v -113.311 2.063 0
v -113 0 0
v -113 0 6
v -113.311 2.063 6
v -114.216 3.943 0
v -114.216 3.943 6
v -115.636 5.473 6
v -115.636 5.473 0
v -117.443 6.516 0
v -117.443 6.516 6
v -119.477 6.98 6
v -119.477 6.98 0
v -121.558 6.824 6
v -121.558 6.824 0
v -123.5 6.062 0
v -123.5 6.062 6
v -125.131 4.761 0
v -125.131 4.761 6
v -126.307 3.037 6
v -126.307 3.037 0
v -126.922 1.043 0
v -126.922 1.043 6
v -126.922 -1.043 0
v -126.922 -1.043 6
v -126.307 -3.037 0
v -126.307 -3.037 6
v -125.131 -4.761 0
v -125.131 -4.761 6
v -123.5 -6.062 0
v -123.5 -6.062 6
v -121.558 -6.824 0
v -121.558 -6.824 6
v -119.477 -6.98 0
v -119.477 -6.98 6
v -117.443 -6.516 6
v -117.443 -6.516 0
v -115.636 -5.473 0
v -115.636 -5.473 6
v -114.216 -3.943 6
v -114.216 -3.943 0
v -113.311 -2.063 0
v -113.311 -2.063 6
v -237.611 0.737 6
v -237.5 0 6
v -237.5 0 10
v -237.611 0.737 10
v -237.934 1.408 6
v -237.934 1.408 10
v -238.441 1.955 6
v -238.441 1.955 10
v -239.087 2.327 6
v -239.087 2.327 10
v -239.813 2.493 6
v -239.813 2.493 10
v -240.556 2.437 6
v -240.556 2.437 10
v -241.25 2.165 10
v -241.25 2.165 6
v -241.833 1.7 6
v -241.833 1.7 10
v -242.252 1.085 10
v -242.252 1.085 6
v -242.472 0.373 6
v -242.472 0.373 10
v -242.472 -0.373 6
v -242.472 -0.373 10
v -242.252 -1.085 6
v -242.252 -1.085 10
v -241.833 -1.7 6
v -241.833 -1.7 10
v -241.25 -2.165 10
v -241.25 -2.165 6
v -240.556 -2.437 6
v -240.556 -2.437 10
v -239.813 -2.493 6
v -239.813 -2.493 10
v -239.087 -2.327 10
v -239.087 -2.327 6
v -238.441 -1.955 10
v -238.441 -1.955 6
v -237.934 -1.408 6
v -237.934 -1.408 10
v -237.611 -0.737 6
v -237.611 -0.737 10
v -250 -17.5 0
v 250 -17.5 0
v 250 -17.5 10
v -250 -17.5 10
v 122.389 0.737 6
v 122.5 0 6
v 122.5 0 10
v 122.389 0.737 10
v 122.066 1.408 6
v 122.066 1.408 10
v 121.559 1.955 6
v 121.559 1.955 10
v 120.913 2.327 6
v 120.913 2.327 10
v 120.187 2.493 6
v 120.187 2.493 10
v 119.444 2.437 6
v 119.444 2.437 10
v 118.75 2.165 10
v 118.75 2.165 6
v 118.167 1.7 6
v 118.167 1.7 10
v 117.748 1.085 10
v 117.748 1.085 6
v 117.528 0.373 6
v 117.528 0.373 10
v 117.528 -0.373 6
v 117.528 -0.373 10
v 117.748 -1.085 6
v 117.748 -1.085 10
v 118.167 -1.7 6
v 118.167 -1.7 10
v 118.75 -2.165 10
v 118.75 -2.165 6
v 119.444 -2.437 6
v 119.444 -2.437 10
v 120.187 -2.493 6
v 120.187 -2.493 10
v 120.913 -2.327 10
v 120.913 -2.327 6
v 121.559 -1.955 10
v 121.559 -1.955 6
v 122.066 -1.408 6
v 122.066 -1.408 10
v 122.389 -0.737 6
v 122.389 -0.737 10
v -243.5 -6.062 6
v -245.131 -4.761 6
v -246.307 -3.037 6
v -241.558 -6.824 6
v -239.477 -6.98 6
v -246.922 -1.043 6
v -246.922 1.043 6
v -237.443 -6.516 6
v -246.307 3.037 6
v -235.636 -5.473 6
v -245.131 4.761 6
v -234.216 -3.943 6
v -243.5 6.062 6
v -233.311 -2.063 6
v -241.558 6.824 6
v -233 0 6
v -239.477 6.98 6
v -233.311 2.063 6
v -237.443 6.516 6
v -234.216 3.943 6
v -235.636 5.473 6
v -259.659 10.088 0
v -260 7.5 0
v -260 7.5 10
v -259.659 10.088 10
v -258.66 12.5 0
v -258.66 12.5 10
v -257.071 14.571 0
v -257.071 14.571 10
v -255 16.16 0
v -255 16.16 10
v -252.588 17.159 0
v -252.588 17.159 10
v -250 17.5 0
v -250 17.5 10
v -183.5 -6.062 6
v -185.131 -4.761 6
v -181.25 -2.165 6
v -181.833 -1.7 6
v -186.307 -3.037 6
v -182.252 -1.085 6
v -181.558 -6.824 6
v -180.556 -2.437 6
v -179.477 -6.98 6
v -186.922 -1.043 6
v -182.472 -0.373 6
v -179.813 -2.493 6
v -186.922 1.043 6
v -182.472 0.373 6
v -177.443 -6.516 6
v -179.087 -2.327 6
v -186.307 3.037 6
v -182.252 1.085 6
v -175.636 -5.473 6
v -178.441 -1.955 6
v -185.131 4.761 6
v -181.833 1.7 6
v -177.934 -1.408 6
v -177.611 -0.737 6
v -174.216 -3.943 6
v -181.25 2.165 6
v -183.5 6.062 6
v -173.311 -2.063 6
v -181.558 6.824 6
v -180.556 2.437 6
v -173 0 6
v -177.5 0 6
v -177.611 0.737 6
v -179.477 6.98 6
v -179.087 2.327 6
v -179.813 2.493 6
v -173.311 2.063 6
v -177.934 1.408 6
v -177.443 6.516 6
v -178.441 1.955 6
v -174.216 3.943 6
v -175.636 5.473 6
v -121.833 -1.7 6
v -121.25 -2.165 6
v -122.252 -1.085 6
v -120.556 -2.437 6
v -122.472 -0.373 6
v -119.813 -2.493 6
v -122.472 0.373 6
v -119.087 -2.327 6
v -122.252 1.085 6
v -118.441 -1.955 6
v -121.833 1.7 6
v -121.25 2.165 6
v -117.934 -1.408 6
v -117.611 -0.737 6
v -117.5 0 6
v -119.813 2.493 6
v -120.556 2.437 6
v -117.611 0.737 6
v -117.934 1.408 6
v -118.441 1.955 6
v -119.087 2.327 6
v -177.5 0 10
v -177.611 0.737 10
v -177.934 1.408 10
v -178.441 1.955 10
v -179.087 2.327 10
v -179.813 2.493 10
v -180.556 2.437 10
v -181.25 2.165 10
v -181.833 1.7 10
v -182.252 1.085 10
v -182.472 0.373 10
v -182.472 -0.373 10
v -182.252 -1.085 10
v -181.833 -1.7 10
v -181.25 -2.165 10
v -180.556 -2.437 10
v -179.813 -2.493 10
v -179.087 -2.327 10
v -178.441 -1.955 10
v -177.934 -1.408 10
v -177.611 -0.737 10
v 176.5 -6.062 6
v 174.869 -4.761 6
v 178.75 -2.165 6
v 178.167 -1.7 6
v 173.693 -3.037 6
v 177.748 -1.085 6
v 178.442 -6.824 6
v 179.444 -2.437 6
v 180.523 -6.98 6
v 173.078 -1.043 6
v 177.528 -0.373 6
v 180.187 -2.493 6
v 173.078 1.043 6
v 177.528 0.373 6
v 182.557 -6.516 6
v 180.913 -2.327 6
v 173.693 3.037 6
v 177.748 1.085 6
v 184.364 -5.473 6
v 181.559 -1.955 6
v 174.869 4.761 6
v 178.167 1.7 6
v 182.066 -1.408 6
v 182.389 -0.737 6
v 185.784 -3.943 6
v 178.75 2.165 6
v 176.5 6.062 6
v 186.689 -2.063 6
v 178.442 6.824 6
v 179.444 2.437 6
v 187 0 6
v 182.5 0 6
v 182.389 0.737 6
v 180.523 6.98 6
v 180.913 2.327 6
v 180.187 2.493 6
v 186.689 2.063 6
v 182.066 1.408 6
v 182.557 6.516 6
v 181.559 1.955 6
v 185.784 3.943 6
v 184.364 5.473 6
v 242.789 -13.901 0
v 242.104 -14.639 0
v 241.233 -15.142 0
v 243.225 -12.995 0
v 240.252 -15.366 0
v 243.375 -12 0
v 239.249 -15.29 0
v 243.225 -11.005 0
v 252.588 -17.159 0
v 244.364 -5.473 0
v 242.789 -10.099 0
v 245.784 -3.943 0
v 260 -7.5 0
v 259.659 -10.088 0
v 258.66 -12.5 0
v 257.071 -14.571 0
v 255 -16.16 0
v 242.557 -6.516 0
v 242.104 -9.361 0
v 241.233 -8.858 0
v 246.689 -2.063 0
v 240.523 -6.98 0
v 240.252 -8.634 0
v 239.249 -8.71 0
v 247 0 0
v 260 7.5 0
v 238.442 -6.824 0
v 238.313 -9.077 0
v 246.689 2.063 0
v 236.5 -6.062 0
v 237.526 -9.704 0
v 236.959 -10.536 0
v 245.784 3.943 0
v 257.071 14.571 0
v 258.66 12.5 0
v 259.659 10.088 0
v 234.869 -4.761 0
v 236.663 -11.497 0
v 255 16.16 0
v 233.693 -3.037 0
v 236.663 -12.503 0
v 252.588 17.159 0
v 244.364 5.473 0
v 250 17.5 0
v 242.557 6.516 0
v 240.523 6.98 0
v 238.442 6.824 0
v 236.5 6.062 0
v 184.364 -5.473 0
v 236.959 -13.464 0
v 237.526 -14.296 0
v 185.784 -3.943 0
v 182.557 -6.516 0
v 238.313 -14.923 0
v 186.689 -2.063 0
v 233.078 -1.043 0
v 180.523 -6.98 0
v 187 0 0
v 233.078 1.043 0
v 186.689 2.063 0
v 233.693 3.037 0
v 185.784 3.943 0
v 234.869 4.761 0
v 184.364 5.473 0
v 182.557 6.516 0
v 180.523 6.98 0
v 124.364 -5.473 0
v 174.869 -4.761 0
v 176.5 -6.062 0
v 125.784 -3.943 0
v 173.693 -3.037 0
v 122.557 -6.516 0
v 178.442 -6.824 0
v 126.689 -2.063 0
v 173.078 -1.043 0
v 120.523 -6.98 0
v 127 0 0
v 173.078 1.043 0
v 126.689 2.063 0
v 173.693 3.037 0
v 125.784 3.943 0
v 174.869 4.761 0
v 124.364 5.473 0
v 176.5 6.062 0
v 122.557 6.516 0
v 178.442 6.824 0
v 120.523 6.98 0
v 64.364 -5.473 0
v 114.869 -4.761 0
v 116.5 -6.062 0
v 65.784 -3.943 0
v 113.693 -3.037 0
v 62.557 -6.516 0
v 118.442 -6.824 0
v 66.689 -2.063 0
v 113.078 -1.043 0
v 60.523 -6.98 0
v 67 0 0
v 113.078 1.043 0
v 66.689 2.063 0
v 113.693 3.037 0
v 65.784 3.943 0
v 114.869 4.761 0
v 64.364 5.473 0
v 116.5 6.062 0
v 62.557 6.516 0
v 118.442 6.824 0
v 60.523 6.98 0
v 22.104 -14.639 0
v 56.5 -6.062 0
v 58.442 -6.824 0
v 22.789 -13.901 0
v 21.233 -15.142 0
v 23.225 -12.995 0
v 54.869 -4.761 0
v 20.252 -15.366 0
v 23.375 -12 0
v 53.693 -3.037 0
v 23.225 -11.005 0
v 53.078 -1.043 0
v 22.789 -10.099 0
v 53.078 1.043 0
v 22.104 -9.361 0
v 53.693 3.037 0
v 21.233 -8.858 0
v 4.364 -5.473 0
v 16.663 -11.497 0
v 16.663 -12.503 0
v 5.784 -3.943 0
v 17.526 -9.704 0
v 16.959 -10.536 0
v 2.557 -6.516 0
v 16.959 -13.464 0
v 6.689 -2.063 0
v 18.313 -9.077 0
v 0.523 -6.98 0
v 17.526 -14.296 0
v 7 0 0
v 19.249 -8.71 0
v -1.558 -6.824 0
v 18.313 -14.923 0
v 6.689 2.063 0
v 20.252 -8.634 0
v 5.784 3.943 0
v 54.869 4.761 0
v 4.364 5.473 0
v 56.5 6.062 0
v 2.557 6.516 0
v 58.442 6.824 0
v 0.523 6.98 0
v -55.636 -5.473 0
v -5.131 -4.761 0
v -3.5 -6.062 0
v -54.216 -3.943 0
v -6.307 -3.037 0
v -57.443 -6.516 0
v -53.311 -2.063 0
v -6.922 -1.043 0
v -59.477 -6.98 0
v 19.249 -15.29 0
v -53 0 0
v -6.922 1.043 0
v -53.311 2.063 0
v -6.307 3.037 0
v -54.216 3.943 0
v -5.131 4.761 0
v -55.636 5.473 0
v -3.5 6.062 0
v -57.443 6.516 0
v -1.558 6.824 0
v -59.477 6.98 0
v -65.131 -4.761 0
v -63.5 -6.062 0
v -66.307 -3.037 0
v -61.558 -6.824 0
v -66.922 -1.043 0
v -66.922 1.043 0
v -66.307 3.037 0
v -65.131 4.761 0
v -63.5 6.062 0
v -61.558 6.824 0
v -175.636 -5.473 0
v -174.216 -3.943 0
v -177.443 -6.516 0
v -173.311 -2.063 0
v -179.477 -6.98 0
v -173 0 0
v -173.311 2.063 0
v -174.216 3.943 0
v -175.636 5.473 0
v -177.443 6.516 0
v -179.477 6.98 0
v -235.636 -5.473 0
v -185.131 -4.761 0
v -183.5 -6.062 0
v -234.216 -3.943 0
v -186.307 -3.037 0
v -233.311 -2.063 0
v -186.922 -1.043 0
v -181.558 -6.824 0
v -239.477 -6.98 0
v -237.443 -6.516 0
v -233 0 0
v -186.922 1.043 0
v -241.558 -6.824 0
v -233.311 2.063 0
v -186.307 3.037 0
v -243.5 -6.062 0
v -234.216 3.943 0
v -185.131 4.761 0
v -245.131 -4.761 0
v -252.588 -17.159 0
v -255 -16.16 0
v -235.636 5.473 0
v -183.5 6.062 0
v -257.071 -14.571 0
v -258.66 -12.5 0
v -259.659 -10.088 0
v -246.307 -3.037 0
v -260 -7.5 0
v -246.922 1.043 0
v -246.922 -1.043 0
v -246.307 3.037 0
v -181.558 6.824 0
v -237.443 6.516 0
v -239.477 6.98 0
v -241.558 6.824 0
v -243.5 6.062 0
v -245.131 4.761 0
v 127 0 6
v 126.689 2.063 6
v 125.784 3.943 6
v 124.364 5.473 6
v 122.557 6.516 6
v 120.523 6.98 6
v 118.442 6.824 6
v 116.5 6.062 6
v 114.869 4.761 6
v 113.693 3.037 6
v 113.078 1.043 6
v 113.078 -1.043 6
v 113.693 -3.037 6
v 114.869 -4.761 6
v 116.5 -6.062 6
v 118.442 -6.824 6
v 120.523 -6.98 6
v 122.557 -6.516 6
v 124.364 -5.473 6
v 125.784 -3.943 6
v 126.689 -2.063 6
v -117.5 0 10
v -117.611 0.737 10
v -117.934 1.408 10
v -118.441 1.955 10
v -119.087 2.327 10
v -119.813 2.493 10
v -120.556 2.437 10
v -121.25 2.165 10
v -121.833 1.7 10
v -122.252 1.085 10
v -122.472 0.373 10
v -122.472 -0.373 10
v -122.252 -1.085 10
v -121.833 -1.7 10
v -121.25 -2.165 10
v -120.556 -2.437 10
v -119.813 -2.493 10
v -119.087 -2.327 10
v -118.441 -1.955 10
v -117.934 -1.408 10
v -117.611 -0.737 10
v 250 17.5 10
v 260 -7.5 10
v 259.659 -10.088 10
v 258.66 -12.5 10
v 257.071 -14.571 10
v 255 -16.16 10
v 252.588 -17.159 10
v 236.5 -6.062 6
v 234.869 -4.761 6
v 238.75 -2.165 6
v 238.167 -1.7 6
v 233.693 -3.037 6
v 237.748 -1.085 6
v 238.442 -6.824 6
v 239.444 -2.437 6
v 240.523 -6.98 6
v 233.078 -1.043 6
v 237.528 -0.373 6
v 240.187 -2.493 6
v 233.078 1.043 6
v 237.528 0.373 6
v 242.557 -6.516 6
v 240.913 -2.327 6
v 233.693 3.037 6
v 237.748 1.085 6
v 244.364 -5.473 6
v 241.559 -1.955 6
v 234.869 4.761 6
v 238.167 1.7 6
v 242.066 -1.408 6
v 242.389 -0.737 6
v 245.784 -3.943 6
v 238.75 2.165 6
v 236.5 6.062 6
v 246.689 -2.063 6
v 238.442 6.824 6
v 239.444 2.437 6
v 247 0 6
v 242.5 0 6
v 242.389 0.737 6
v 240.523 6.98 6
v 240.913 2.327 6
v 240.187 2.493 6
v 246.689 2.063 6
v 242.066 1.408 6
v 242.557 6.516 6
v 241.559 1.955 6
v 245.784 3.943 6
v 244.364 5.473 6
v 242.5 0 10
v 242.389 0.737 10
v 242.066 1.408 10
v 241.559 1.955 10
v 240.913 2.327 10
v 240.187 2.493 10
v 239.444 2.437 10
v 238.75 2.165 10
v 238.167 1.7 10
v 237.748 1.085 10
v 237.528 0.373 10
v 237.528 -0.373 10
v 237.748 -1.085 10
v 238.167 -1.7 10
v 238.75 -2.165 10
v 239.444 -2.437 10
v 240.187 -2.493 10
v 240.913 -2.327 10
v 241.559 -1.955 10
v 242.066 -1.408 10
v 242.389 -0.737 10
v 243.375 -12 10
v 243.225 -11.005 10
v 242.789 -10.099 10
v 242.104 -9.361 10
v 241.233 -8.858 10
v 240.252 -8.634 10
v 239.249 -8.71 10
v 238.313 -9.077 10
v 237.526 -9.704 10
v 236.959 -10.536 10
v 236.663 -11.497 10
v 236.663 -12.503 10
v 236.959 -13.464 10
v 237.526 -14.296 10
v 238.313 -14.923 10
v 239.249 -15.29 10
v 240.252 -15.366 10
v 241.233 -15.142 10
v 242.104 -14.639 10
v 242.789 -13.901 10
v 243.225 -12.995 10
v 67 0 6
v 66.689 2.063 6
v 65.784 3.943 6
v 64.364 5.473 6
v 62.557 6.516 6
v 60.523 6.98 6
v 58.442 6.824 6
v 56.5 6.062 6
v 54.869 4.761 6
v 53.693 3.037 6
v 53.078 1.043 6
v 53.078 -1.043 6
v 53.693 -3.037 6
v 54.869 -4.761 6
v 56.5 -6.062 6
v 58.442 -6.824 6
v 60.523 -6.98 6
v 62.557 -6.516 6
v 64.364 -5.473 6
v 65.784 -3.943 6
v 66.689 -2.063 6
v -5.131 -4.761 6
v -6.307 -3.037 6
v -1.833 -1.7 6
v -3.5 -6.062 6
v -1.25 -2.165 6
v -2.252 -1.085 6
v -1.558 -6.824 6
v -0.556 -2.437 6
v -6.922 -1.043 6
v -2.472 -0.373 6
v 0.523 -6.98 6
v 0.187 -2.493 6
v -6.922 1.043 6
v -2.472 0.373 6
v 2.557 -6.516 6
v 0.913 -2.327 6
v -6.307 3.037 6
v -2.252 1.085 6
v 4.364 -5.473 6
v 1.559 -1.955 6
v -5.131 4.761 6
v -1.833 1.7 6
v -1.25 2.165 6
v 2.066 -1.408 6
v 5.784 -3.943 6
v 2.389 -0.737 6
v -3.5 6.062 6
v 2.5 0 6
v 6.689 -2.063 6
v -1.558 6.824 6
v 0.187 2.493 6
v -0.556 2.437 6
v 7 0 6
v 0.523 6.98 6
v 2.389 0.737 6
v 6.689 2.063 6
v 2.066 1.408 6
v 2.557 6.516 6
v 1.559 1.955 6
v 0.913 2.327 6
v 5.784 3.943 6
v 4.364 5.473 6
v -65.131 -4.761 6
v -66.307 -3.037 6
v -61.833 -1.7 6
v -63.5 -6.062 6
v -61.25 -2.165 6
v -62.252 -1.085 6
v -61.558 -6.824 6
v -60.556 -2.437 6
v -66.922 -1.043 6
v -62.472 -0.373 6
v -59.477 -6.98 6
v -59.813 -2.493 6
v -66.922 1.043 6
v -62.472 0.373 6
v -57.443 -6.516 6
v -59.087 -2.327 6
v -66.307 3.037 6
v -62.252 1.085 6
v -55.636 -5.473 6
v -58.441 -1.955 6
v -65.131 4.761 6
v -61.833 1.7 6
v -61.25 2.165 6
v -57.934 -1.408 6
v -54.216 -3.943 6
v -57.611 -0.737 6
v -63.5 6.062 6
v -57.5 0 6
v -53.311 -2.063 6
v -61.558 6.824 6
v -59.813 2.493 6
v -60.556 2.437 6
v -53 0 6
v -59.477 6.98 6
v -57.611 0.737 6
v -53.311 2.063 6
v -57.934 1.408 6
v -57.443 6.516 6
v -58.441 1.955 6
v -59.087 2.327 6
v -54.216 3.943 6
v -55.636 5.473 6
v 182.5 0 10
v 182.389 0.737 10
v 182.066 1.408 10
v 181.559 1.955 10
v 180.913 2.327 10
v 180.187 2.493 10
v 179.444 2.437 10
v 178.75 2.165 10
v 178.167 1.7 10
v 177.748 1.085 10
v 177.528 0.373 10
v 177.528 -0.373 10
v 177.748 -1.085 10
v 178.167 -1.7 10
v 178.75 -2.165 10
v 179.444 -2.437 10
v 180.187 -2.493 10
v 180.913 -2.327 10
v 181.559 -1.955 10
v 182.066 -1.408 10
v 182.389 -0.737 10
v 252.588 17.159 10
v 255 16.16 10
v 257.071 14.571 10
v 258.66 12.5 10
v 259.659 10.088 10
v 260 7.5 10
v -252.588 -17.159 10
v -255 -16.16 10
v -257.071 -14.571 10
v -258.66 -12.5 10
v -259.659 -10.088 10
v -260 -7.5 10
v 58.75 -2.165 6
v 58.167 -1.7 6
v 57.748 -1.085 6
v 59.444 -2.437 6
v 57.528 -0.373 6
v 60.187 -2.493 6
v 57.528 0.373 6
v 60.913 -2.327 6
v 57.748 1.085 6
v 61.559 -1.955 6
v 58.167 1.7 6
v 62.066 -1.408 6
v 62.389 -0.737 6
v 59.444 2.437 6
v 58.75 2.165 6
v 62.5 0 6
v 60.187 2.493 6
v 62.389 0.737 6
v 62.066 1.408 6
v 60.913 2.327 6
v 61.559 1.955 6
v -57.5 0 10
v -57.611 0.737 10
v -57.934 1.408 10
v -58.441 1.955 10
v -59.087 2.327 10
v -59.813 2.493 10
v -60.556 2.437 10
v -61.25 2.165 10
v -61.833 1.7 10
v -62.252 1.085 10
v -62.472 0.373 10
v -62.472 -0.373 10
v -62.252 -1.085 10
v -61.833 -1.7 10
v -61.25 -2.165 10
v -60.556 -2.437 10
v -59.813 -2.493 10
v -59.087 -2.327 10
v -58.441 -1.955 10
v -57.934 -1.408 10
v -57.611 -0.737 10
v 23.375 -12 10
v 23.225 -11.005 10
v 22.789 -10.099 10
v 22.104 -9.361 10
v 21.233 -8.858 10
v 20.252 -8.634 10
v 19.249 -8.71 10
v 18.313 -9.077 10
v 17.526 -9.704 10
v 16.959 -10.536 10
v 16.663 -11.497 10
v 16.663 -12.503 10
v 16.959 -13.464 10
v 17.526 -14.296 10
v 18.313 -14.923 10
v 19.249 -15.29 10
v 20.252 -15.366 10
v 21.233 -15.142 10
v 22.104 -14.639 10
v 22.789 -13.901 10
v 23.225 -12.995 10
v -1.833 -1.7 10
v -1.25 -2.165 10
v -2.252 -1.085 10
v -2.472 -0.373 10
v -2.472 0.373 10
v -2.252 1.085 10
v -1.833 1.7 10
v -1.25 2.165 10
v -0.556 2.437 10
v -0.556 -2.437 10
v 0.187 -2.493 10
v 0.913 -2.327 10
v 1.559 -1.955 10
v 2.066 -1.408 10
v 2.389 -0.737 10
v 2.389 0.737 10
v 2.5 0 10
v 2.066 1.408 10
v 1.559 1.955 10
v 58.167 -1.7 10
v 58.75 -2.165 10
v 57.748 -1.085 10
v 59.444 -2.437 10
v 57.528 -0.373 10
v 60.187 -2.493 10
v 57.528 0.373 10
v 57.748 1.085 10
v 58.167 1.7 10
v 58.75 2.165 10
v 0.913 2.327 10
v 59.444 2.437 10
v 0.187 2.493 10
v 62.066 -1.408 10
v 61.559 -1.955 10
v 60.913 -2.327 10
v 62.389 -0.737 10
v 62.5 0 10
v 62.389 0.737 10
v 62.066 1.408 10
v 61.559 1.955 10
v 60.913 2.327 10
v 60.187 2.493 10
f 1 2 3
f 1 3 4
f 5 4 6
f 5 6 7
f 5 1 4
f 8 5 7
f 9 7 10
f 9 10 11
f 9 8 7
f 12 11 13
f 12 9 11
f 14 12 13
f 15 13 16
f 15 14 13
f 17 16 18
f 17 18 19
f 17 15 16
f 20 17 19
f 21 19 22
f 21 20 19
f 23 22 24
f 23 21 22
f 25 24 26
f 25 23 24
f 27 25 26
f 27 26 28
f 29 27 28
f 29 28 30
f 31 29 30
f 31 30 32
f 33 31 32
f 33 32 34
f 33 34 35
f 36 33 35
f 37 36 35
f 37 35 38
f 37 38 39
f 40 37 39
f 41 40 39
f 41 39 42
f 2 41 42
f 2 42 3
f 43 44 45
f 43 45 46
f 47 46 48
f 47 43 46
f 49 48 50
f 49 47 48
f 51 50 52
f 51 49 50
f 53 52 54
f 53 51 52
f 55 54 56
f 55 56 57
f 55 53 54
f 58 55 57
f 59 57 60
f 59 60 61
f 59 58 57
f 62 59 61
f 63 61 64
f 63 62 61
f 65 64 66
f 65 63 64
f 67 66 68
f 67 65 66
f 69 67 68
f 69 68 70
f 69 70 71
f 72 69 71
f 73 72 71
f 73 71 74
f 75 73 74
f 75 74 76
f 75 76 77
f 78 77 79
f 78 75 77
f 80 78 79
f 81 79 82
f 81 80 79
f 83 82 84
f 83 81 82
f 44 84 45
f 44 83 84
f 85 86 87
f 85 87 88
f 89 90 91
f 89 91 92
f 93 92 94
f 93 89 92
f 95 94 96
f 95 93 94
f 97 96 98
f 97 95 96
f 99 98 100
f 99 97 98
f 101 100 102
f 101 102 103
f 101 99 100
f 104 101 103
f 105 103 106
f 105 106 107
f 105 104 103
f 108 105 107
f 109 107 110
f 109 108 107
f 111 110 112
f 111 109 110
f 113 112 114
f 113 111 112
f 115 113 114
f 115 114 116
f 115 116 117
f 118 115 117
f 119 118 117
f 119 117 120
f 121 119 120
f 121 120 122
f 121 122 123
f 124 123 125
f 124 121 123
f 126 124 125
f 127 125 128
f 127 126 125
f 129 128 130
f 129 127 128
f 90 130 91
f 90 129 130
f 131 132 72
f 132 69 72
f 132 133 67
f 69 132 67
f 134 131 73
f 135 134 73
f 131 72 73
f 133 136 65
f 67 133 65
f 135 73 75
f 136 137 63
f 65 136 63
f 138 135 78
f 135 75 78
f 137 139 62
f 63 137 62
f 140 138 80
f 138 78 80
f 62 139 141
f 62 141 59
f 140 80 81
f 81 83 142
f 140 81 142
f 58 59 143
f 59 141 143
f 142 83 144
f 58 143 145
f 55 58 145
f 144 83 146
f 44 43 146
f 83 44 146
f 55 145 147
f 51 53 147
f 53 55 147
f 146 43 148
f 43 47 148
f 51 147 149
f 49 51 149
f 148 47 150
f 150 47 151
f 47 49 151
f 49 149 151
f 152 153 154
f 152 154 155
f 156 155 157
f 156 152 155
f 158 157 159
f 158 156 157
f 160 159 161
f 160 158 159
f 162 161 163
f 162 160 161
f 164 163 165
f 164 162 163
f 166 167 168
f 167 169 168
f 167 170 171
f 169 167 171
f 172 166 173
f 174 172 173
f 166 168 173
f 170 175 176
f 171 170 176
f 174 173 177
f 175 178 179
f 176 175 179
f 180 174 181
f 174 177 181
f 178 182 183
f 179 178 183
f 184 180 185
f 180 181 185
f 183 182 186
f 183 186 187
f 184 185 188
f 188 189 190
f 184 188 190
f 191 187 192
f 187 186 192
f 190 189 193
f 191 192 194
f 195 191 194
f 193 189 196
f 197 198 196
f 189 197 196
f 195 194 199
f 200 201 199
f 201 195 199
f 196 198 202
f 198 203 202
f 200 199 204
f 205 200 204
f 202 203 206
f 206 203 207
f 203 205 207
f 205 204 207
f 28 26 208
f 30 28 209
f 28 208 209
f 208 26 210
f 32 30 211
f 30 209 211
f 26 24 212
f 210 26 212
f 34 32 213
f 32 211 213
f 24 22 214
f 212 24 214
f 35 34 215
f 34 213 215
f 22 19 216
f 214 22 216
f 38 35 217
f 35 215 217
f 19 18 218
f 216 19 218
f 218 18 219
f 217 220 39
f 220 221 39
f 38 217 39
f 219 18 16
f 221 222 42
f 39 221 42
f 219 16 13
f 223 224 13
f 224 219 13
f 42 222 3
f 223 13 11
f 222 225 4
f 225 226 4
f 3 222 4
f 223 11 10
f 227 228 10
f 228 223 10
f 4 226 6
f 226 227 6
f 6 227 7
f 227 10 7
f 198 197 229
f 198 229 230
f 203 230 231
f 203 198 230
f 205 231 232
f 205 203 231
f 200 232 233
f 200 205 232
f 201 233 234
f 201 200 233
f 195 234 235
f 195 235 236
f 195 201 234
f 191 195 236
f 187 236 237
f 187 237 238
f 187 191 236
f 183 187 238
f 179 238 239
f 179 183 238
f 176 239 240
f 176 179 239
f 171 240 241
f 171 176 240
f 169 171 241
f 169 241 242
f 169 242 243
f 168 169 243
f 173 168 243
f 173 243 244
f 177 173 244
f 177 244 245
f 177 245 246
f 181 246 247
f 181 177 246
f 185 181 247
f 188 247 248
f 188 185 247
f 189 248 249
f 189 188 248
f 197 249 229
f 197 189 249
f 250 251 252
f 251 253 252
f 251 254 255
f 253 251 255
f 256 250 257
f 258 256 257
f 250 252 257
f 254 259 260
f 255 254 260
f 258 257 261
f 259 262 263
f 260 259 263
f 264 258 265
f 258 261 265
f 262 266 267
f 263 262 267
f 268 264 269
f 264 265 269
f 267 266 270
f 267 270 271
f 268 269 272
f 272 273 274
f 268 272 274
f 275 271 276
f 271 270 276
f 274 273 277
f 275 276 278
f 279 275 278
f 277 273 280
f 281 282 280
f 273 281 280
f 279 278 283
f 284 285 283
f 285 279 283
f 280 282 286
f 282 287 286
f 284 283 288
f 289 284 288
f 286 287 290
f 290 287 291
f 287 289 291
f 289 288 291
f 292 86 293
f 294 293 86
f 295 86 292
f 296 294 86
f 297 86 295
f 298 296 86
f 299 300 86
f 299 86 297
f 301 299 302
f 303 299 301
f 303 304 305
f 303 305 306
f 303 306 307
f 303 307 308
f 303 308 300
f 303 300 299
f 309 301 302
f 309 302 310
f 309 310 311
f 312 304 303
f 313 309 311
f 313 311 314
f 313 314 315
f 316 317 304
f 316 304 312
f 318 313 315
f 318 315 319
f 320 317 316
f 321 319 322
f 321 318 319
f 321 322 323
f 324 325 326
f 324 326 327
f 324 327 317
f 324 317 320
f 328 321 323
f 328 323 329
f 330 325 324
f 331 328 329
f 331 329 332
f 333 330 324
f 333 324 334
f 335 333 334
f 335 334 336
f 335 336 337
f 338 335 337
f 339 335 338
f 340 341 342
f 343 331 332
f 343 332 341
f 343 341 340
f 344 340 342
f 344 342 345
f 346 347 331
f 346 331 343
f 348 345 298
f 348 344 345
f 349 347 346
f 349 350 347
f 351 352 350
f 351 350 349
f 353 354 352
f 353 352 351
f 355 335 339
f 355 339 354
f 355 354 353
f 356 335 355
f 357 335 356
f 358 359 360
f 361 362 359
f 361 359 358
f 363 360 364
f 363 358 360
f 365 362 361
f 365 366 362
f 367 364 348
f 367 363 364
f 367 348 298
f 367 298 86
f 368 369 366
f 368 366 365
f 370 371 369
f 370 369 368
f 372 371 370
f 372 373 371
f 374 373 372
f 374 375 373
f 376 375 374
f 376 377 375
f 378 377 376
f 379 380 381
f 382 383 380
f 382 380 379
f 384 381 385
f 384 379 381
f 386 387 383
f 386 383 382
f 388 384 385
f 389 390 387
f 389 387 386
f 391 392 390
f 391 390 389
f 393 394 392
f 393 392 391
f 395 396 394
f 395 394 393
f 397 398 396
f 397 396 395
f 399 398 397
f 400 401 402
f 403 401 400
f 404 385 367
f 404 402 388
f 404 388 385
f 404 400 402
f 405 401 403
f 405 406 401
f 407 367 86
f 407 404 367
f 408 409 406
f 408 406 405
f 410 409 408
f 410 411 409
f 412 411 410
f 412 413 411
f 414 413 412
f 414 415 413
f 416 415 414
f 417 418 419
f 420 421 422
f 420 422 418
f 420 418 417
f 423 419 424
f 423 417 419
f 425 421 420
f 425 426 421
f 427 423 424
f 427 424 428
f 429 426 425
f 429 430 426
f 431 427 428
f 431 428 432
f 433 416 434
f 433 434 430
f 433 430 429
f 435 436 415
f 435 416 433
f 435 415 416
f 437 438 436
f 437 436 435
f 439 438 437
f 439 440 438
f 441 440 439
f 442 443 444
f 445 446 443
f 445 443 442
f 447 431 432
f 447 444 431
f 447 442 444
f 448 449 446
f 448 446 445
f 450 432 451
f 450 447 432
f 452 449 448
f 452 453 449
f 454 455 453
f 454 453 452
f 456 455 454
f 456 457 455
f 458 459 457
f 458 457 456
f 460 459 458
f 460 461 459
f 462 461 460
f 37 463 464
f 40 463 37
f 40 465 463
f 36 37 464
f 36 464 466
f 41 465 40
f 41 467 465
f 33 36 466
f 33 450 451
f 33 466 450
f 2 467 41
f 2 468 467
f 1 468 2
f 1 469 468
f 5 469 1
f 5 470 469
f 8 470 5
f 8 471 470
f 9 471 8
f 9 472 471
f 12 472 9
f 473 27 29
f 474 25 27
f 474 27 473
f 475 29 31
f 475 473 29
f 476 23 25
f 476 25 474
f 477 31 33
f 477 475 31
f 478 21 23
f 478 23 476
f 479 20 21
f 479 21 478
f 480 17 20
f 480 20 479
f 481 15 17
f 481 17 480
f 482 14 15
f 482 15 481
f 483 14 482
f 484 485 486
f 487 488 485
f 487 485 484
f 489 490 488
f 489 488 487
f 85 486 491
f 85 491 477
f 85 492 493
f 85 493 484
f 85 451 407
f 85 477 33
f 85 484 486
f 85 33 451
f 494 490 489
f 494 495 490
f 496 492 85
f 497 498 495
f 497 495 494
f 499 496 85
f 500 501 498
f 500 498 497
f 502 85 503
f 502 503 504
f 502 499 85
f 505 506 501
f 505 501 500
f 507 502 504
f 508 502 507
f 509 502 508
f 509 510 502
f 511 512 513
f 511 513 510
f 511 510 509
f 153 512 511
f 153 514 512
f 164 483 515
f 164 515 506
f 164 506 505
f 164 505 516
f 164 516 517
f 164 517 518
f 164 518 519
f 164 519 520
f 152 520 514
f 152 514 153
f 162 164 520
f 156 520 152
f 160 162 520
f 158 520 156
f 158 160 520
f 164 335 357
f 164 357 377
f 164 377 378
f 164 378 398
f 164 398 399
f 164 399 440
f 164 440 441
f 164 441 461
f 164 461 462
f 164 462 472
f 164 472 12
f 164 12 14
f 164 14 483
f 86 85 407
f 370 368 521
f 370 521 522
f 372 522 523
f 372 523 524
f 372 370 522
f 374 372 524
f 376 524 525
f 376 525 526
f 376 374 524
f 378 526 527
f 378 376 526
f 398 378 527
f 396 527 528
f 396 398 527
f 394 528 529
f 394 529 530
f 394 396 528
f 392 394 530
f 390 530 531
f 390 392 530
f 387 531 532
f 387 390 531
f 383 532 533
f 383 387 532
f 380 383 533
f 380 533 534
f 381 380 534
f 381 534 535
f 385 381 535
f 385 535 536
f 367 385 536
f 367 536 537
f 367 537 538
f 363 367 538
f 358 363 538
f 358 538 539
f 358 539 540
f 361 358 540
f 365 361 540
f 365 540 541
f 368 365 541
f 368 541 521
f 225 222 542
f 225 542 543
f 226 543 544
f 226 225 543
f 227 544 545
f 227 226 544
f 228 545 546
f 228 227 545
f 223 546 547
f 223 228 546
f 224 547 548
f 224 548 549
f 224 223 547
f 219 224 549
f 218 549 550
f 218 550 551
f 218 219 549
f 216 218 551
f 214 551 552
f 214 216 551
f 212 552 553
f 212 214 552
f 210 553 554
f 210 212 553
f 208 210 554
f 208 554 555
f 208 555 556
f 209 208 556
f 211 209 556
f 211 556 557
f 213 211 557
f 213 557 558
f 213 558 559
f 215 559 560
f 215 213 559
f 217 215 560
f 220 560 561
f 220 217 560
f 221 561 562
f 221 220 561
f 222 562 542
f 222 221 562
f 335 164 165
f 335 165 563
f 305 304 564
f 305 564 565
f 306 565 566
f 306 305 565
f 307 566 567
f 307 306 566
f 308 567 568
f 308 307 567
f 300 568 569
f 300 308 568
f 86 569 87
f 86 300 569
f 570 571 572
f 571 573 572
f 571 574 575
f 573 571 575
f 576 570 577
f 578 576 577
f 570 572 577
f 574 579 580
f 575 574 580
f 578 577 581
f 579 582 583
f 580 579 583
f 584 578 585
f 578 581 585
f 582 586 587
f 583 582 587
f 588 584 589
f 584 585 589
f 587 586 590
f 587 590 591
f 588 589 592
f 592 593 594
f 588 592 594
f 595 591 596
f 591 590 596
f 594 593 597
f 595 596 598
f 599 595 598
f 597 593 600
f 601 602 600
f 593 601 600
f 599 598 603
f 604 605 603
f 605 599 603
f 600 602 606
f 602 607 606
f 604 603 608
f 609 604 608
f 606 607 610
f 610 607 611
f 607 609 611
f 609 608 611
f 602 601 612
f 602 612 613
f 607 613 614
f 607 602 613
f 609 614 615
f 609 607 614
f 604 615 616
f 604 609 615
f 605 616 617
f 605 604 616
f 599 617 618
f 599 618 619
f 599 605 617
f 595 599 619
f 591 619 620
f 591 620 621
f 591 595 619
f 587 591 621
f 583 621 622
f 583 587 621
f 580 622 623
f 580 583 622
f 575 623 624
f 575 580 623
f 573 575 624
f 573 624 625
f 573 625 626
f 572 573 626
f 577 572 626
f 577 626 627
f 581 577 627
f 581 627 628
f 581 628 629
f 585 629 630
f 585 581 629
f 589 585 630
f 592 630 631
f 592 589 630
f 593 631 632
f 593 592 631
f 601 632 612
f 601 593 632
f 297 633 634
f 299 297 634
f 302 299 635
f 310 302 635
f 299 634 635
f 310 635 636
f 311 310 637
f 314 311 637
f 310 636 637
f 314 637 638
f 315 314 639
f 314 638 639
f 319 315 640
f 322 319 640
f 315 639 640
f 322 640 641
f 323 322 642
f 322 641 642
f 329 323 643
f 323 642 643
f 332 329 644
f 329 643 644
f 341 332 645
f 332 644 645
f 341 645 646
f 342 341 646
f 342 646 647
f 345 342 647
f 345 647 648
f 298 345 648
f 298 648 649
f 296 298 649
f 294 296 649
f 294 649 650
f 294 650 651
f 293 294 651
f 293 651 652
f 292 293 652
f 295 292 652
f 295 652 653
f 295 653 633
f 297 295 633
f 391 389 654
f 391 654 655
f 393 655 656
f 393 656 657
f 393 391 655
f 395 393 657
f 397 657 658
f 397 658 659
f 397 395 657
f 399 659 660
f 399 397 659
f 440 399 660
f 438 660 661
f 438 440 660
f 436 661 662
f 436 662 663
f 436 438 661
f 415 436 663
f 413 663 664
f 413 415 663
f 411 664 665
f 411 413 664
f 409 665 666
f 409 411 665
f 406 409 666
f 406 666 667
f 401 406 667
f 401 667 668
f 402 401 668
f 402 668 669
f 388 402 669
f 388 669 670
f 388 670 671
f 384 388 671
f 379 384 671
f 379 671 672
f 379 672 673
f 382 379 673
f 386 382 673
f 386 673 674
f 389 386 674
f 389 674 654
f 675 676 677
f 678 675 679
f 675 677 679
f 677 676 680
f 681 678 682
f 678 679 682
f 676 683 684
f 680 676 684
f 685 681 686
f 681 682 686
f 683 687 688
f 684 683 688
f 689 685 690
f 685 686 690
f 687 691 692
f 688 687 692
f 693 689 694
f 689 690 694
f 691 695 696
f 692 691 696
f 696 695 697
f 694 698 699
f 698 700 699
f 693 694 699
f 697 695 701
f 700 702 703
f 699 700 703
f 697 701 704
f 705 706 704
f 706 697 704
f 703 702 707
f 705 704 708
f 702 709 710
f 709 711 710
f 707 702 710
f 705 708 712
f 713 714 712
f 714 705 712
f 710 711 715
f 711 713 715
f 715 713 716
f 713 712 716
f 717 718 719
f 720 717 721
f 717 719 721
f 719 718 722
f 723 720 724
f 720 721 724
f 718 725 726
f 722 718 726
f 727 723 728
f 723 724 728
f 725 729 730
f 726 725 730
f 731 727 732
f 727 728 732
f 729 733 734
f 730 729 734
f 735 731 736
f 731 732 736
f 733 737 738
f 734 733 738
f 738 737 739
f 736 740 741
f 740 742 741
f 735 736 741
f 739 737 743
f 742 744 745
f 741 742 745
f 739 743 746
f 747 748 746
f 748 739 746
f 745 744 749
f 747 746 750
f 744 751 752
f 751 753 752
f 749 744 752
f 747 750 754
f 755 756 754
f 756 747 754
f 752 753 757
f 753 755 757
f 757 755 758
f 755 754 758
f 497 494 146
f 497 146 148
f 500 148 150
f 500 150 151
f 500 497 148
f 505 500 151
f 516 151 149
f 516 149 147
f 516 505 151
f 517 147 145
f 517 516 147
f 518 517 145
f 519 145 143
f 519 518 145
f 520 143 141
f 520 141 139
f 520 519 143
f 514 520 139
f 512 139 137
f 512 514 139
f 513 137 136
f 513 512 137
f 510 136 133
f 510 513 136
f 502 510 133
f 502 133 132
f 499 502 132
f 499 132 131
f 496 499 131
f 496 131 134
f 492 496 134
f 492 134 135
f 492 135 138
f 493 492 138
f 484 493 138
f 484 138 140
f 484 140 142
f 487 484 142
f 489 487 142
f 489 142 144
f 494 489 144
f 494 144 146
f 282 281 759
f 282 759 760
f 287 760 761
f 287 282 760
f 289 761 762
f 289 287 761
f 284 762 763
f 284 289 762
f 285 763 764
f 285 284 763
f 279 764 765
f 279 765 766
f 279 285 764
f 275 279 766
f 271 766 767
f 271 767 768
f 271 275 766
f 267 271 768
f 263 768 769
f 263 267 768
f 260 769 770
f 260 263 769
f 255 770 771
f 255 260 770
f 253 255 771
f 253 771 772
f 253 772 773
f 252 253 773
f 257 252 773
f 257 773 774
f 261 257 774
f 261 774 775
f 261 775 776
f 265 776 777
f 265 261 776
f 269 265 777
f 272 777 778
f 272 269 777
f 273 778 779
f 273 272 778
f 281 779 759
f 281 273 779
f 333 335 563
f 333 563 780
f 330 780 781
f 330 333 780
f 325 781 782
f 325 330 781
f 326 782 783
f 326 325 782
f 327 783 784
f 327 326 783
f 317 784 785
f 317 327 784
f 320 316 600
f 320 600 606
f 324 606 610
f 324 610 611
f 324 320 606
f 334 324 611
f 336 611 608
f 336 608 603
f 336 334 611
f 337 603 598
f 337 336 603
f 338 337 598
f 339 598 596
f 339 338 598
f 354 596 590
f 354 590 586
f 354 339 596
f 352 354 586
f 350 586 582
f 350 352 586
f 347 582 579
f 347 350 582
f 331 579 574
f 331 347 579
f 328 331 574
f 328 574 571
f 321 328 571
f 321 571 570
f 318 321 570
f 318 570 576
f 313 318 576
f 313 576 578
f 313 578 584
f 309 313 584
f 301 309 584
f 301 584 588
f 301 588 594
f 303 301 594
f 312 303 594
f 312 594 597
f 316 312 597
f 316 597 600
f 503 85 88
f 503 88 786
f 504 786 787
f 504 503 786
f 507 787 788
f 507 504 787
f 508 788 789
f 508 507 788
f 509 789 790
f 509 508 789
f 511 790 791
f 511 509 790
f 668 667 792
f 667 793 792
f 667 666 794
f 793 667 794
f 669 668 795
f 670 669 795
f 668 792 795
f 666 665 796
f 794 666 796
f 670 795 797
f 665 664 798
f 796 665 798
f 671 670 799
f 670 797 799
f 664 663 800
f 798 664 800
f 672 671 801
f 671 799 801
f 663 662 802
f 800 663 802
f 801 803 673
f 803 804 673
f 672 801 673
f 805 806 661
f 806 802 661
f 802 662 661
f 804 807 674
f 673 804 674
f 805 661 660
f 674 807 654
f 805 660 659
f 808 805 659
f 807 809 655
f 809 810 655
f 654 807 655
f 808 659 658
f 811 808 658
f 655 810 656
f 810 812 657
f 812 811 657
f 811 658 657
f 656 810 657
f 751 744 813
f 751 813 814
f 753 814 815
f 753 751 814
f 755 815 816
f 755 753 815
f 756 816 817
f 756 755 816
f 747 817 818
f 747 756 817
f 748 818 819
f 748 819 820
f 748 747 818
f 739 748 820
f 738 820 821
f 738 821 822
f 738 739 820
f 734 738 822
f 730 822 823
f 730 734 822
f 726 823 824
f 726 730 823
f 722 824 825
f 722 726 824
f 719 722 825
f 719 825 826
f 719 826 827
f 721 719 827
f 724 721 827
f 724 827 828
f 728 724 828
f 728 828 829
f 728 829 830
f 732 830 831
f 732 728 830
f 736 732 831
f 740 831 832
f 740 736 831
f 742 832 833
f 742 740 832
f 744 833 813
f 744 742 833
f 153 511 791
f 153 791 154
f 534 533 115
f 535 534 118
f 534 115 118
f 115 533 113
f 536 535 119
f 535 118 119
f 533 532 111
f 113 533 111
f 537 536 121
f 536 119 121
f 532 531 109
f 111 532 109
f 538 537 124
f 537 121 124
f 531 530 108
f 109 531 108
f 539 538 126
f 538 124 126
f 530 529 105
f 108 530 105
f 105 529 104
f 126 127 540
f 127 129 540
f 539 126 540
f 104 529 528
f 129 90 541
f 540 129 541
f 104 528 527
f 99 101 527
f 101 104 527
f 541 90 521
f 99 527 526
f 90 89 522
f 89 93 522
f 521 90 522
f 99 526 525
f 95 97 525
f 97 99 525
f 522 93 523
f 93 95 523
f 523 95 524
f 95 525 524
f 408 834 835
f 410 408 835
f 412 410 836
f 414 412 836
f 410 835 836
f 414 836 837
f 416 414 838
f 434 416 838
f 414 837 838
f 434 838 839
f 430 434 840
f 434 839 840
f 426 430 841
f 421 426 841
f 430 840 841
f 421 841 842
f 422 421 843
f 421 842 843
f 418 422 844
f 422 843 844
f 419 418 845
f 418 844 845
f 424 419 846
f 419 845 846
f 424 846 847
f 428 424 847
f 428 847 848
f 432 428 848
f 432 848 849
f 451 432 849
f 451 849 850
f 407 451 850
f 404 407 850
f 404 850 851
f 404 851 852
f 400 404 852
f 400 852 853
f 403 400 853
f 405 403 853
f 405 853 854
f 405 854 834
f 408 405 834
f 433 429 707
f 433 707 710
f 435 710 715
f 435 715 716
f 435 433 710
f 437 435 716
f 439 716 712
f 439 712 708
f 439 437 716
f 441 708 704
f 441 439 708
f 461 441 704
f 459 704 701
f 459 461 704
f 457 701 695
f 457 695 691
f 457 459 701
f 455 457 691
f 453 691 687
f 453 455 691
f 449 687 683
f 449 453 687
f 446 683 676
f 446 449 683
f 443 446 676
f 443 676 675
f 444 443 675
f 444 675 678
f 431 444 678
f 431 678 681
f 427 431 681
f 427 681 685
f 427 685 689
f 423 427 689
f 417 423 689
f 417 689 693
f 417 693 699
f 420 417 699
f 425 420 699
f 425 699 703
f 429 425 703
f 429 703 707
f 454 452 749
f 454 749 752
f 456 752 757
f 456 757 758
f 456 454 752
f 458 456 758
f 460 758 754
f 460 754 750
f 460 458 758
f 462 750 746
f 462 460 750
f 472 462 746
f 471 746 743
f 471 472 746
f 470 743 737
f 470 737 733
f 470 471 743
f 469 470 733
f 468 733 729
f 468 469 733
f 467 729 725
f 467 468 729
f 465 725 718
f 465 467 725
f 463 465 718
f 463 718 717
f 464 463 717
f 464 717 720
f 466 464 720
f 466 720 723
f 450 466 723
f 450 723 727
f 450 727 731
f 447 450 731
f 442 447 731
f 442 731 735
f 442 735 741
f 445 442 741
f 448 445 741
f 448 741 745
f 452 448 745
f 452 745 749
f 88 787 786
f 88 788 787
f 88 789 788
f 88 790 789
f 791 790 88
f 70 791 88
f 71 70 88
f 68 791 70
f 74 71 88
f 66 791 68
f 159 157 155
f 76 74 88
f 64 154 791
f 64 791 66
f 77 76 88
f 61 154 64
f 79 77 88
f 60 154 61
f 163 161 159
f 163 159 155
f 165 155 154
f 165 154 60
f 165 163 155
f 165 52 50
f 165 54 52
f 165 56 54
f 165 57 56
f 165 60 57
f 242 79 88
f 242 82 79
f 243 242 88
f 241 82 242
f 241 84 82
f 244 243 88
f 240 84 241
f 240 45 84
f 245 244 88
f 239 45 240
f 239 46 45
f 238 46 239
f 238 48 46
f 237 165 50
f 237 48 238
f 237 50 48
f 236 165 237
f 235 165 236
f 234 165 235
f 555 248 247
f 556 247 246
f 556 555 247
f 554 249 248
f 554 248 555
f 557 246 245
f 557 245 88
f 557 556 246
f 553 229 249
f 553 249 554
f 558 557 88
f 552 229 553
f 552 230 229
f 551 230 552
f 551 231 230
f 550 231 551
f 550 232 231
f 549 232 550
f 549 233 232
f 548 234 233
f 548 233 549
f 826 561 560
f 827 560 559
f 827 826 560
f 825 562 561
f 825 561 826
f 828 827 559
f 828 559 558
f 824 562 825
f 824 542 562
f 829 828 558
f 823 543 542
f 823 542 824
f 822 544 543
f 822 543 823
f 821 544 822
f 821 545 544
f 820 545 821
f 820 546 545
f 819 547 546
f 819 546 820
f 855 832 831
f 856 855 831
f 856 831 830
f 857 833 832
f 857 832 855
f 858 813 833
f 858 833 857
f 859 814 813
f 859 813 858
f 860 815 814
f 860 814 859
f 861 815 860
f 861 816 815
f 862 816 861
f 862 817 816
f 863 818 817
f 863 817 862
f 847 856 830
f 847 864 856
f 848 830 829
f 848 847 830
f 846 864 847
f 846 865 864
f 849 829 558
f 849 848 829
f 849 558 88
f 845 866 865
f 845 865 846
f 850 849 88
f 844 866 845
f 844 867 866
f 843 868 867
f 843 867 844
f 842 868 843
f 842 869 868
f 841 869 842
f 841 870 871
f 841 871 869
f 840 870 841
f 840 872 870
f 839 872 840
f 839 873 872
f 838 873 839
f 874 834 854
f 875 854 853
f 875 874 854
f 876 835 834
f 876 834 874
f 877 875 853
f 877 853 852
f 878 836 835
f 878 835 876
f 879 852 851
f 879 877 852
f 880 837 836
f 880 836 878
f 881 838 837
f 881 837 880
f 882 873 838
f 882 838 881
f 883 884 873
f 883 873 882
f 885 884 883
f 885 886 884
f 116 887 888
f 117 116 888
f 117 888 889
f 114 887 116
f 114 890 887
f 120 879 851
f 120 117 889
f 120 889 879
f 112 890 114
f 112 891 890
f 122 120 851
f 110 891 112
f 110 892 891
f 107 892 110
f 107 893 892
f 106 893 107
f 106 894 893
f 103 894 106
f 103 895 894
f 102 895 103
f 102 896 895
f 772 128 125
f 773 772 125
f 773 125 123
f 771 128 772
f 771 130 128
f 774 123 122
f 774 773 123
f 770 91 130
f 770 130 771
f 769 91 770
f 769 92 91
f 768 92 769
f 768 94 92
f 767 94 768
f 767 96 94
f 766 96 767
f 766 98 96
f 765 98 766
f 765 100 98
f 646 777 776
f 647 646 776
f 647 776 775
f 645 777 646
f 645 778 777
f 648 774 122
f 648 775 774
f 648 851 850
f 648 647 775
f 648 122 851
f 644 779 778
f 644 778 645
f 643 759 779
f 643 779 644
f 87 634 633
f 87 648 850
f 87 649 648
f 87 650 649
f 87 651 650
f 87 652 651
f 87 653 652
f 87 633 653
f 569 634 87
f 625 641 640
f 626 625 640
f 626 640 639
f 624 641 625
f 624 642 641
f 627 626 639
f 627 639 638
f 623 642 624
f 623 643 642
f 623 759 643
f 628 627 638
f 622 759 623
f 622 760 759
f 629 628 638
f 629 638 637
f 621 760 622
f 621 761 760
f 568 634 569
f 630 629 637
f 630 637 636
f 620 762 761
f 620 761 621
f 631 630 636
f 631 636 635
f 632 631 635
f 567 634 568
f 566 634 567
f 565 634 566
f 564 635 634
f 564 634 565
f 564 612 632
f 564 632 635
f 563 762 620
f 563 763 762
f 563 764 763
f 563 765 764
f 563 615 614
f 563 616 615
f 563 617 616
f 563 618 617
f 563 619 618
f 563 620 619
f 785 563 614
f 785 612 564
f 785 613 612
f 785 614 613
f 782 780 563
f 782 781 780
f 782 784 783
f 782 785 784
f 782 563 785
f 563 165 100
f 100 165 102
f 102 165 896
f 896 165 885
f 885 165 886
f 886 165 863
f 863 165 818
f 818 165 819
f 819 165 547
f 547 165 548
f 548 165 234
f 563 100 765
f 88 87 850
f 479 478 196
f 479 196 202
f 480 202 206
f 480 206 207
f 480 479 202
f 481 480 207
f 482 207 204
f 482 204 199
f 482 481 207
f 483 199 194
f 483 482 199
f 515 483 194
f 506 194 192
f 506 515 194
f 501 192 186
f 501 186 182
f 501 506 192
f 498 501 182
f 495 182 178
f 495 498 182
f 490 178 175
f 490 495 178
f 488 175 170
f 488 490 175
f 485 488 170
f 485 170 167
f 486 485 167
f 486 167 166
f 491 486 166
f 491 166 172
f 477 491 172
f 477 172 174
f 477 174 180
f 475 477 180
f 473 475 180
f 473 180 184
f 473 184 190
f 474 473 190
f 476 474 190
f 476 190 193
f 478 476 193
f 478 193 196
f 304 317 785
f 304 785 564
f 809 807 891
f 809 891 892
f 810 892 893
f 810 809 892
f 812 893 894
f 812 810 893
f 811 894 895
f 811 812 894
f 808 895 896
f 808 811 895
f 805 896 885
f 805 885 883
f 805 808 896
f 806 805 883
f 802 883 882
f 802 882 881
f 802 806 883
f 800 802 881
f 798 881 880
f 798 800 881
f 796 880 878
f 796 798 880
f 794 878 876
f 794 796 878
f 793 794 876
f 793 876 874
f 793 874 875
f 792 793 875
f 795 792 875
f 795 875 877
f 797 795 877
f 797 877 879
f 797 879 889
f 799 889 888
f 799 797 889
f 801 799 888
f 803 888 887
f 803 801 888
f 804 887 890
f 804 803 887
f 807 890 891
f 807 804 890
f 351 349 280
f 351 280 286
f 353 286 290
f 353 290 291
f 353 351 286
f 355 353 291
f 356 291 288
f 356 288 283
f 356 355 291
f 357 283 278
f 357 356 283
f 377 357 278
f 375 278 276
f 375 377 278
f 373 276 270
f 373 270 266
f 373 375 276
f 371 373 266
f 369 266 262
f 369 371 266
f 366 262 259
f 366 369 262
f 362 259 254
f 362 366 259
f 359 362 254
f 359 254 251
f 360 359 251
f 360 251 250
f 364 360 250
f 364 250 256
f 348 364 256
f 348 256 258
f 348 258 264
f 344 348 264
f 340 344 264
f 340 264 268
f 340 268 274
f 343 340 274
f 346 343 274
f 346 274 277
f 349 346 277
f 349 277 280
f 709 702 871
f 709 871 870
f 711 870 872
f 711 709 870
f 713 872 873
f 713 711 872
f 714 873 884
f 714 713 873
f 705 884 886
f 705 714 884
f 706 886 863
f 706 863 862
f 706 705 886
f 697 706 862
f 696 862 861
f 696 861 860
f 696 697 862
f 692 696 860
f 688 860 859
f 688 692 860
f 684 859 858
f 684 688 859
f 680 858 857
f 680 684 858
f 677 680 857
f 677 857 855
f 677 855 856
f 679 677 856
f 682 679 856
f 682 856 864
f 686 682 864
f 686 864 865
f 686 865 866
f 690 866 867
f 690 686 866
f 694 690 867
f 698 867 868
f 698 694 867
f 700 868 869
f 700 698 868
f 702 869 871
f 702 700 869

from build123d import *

# Parameters (mm, degrees)
ESQUISSE1_R             = 7
BOSS_EXTRU_1_DEPTH      = 10
BOSS_EXTRU_2_START      = -4
ESQUISSE2_R             = 7
ESQUISSE2_R_2           = 2.5
BOSS_EXTRU_2_DEPTH      = 4
ESQUISSE3_R             = 3.375
ENL_V_MAT_EXTRU_1_DEPTH = 261.780079761
ESQUISSE4_R             = 3.375
ENL_V_MAT_EXTRU_2_DEPTH = 261.780079761


with BuildPart() as part:
    # Esquisse1 → Boss.-Extru.1 (new body)
    with BuildSketch(Plane.XY):
        with BuildLine():
            Line((-250, 17.5), (250, 17.5))
            ThreePointArc((250, 17.5), (257.071067812, 14.571067812), (260, 7.5))
            Line((260, 7.5), (260, -7.5))
            ThreePointArc((260, -7.5), (257.071067812, -14.571067812), (250, -17.5))
            Line((250, -17.5), (-250, -17.5))
            ThreePointArc((-250, -17.5), (-257.071067812, -14.571067812), (-260, -7.5))
            Line((-260, -7.5), (-260, 7.5))
            ThreePointArc((-260, 7.5), (-257.071067812, 14.571067812), (-250, 17.5))
        make_face()
        with Locations((-240, 0)):
            Circle(ESQUISSE1_R, mode=Mode.SUBTRACT)
        with Locations((-180, 0)):
            Circle(ESQUISSE1_R, mode=Mode.SUBTRACT)
        with Locations((-120, 0)):
            Circle(ESQUISSE1_R, mode=Mode.SUBTRACT)
        with Locations((-60, 0)):
            Circle(ESQUISSE1_R, mode=Mode.SUBTRACT)
        Circle(ESQUISSE1_R, mode=Mode.SUBTRACT)
        with Locations((60, 0)):
            Circle(ESQUISSE1_R, mode=Mode.SUBTRACT)
        with Locations((120, 0)):
            Circle(ESQUISSE1_R, mode=Mode.SUBTRACT)
        with Locations((180, 0)):
            Circle(ESQUISSE1_R, mode=Mode.SUBTRACT)
        with Locations((240, 0)):
            Circle(ESQUISSE1_R, mode=Mode.SUBTRACT)
    extrude(amount=BOSS_EXTRU_1_DEPTH)

    # Esquisse2 → Boss.-Extru.2 (add)
    # profile 1 of 9: a face of its own
    with BuildSketch(Plane.XY.offset(10).offset(BOSS_EXTRU_2_START)):
        with Locations((-240, 0)):
            Circle(ESQUISSE2_R)
        with Locations((-240, 0)):
            Circle(ESQUISSE2_R_2, mode=Mode.SUBTRACT)
    # profile 2 of 9: a face of its own
    with BuildSketch(Plane.XY.offset(10).offset(BOSS_EXTRU_2_START)):
        with Locations((-180, 0)):
            Circle(ESQUISSE2_R)
        with Locations((-180, 0)):
            Circle(ESQUISSE2_R_2, mode=Mode.SUBTRACT)
    # profile 3 of 9: a face of its own
    with BuildSketch(Plane.XY.offset(10).offset(BOSS_EXTRU_2_START)):
        with Locations((-120, 0)):
            Circle(ESQUISSE2_R)
        with Locations((-120, 0)):
            Circle(ESQUISSE2_R_2, mode=Mode.SUBTRACT)
    # profile 4 of 9: a face of its own
    with BuildSketch(Plane.XY.offset(10).offset(BOSS_EXTRU_2_START)):
        with Locations((-60, 0)):
            Circle(ESQUISSE2_R)
        with Locations((-60, 0)):
            Circle(ESQUISSE2_R_2, mode=Mode.SUBTRACT)
    # profile 5 of 9: a face of its own
    with BuildSketch(Plane.XY.offset(10).offset(BOSS_EXTRU_2_START)):
        Circle(ESQUISSE2_R)
        Circle(ESQUISSE2_R_2, mode=Mode.SUBTRACT)
    # profile 6 of 9: a face of its own
    with BuildSketch(Plane.XY.offset(10).offset(BOSS_EXTRU_2_START)):
        with Locations((60, 0)):
            Circle(ESQUISSE2_R)
        with Locations((60, 0)):
            Circle(ESQUISSE2_R_2, mode=Mode.SUBTRACT)
    # profile 7 of 9: a face of its own
    with BuildSketch(Plane.XY.offset(10).offset(BOSS_EXTRU_2_START)):
        with Locations((120, 0)):
            Circle(ESQUISSE2_R)
        with Locations((120, 0)):
            Circle(ESQUISSE2_R_2, mode=Mode.SUBTRACT)
    # profile 8 of 9: a face of its own
    with BuildSketch(Plane.XY.offset(10).offset(BOSS_EXTRU_2_START)):
        with Locations((180, 0)):
            Circle(ESQUISSE2_R)
        with Locations((180, 0)):
            Circle(ESQUISSE2_R_2, mode=Mode.SUBTRACT)
    # profile 9 of 9: a face of its own
    with BuildSketch(Plane.XY.offset(10).offset(BOSS_EXTRU_2_START)):
        with Locations((240, 0)):
            Circle(ESQUISSE2_R)
        with Locations((240, 0)):
            Circle(ESQUISSE2_R_2, mode=Mode.SUBTRACT)
    extrude(amount=BOSS_EXTRU_2_DEPTH)

    # Esquisse3 → Enlèv. mat.-Extru.1 (cut, through all)
    with BuildSketch(Plane.XY.offset(10)):
        with Locations((20.000000156, -12.000000313)):
            Circle(ESQUISSE3_R)
    extrude(amount=-ENL_V_MAT_EXTRU_1_DEPTH, mode=Mode.SUBTRACT)

    # Esquisse4 → Enlèv. mat.-Extru.2 (cut, through all)
    with BuildSketch(Plane.XY.offset(10)):
        with Locations((240.000000156, -12.000000313)):
            Circle(ESQUISSE4_R)
    extrude(amount=-ENL_V_MAT_EXTRU_2_DEPTH, mode=Mode.SUBTRACT)


solid = part.part
